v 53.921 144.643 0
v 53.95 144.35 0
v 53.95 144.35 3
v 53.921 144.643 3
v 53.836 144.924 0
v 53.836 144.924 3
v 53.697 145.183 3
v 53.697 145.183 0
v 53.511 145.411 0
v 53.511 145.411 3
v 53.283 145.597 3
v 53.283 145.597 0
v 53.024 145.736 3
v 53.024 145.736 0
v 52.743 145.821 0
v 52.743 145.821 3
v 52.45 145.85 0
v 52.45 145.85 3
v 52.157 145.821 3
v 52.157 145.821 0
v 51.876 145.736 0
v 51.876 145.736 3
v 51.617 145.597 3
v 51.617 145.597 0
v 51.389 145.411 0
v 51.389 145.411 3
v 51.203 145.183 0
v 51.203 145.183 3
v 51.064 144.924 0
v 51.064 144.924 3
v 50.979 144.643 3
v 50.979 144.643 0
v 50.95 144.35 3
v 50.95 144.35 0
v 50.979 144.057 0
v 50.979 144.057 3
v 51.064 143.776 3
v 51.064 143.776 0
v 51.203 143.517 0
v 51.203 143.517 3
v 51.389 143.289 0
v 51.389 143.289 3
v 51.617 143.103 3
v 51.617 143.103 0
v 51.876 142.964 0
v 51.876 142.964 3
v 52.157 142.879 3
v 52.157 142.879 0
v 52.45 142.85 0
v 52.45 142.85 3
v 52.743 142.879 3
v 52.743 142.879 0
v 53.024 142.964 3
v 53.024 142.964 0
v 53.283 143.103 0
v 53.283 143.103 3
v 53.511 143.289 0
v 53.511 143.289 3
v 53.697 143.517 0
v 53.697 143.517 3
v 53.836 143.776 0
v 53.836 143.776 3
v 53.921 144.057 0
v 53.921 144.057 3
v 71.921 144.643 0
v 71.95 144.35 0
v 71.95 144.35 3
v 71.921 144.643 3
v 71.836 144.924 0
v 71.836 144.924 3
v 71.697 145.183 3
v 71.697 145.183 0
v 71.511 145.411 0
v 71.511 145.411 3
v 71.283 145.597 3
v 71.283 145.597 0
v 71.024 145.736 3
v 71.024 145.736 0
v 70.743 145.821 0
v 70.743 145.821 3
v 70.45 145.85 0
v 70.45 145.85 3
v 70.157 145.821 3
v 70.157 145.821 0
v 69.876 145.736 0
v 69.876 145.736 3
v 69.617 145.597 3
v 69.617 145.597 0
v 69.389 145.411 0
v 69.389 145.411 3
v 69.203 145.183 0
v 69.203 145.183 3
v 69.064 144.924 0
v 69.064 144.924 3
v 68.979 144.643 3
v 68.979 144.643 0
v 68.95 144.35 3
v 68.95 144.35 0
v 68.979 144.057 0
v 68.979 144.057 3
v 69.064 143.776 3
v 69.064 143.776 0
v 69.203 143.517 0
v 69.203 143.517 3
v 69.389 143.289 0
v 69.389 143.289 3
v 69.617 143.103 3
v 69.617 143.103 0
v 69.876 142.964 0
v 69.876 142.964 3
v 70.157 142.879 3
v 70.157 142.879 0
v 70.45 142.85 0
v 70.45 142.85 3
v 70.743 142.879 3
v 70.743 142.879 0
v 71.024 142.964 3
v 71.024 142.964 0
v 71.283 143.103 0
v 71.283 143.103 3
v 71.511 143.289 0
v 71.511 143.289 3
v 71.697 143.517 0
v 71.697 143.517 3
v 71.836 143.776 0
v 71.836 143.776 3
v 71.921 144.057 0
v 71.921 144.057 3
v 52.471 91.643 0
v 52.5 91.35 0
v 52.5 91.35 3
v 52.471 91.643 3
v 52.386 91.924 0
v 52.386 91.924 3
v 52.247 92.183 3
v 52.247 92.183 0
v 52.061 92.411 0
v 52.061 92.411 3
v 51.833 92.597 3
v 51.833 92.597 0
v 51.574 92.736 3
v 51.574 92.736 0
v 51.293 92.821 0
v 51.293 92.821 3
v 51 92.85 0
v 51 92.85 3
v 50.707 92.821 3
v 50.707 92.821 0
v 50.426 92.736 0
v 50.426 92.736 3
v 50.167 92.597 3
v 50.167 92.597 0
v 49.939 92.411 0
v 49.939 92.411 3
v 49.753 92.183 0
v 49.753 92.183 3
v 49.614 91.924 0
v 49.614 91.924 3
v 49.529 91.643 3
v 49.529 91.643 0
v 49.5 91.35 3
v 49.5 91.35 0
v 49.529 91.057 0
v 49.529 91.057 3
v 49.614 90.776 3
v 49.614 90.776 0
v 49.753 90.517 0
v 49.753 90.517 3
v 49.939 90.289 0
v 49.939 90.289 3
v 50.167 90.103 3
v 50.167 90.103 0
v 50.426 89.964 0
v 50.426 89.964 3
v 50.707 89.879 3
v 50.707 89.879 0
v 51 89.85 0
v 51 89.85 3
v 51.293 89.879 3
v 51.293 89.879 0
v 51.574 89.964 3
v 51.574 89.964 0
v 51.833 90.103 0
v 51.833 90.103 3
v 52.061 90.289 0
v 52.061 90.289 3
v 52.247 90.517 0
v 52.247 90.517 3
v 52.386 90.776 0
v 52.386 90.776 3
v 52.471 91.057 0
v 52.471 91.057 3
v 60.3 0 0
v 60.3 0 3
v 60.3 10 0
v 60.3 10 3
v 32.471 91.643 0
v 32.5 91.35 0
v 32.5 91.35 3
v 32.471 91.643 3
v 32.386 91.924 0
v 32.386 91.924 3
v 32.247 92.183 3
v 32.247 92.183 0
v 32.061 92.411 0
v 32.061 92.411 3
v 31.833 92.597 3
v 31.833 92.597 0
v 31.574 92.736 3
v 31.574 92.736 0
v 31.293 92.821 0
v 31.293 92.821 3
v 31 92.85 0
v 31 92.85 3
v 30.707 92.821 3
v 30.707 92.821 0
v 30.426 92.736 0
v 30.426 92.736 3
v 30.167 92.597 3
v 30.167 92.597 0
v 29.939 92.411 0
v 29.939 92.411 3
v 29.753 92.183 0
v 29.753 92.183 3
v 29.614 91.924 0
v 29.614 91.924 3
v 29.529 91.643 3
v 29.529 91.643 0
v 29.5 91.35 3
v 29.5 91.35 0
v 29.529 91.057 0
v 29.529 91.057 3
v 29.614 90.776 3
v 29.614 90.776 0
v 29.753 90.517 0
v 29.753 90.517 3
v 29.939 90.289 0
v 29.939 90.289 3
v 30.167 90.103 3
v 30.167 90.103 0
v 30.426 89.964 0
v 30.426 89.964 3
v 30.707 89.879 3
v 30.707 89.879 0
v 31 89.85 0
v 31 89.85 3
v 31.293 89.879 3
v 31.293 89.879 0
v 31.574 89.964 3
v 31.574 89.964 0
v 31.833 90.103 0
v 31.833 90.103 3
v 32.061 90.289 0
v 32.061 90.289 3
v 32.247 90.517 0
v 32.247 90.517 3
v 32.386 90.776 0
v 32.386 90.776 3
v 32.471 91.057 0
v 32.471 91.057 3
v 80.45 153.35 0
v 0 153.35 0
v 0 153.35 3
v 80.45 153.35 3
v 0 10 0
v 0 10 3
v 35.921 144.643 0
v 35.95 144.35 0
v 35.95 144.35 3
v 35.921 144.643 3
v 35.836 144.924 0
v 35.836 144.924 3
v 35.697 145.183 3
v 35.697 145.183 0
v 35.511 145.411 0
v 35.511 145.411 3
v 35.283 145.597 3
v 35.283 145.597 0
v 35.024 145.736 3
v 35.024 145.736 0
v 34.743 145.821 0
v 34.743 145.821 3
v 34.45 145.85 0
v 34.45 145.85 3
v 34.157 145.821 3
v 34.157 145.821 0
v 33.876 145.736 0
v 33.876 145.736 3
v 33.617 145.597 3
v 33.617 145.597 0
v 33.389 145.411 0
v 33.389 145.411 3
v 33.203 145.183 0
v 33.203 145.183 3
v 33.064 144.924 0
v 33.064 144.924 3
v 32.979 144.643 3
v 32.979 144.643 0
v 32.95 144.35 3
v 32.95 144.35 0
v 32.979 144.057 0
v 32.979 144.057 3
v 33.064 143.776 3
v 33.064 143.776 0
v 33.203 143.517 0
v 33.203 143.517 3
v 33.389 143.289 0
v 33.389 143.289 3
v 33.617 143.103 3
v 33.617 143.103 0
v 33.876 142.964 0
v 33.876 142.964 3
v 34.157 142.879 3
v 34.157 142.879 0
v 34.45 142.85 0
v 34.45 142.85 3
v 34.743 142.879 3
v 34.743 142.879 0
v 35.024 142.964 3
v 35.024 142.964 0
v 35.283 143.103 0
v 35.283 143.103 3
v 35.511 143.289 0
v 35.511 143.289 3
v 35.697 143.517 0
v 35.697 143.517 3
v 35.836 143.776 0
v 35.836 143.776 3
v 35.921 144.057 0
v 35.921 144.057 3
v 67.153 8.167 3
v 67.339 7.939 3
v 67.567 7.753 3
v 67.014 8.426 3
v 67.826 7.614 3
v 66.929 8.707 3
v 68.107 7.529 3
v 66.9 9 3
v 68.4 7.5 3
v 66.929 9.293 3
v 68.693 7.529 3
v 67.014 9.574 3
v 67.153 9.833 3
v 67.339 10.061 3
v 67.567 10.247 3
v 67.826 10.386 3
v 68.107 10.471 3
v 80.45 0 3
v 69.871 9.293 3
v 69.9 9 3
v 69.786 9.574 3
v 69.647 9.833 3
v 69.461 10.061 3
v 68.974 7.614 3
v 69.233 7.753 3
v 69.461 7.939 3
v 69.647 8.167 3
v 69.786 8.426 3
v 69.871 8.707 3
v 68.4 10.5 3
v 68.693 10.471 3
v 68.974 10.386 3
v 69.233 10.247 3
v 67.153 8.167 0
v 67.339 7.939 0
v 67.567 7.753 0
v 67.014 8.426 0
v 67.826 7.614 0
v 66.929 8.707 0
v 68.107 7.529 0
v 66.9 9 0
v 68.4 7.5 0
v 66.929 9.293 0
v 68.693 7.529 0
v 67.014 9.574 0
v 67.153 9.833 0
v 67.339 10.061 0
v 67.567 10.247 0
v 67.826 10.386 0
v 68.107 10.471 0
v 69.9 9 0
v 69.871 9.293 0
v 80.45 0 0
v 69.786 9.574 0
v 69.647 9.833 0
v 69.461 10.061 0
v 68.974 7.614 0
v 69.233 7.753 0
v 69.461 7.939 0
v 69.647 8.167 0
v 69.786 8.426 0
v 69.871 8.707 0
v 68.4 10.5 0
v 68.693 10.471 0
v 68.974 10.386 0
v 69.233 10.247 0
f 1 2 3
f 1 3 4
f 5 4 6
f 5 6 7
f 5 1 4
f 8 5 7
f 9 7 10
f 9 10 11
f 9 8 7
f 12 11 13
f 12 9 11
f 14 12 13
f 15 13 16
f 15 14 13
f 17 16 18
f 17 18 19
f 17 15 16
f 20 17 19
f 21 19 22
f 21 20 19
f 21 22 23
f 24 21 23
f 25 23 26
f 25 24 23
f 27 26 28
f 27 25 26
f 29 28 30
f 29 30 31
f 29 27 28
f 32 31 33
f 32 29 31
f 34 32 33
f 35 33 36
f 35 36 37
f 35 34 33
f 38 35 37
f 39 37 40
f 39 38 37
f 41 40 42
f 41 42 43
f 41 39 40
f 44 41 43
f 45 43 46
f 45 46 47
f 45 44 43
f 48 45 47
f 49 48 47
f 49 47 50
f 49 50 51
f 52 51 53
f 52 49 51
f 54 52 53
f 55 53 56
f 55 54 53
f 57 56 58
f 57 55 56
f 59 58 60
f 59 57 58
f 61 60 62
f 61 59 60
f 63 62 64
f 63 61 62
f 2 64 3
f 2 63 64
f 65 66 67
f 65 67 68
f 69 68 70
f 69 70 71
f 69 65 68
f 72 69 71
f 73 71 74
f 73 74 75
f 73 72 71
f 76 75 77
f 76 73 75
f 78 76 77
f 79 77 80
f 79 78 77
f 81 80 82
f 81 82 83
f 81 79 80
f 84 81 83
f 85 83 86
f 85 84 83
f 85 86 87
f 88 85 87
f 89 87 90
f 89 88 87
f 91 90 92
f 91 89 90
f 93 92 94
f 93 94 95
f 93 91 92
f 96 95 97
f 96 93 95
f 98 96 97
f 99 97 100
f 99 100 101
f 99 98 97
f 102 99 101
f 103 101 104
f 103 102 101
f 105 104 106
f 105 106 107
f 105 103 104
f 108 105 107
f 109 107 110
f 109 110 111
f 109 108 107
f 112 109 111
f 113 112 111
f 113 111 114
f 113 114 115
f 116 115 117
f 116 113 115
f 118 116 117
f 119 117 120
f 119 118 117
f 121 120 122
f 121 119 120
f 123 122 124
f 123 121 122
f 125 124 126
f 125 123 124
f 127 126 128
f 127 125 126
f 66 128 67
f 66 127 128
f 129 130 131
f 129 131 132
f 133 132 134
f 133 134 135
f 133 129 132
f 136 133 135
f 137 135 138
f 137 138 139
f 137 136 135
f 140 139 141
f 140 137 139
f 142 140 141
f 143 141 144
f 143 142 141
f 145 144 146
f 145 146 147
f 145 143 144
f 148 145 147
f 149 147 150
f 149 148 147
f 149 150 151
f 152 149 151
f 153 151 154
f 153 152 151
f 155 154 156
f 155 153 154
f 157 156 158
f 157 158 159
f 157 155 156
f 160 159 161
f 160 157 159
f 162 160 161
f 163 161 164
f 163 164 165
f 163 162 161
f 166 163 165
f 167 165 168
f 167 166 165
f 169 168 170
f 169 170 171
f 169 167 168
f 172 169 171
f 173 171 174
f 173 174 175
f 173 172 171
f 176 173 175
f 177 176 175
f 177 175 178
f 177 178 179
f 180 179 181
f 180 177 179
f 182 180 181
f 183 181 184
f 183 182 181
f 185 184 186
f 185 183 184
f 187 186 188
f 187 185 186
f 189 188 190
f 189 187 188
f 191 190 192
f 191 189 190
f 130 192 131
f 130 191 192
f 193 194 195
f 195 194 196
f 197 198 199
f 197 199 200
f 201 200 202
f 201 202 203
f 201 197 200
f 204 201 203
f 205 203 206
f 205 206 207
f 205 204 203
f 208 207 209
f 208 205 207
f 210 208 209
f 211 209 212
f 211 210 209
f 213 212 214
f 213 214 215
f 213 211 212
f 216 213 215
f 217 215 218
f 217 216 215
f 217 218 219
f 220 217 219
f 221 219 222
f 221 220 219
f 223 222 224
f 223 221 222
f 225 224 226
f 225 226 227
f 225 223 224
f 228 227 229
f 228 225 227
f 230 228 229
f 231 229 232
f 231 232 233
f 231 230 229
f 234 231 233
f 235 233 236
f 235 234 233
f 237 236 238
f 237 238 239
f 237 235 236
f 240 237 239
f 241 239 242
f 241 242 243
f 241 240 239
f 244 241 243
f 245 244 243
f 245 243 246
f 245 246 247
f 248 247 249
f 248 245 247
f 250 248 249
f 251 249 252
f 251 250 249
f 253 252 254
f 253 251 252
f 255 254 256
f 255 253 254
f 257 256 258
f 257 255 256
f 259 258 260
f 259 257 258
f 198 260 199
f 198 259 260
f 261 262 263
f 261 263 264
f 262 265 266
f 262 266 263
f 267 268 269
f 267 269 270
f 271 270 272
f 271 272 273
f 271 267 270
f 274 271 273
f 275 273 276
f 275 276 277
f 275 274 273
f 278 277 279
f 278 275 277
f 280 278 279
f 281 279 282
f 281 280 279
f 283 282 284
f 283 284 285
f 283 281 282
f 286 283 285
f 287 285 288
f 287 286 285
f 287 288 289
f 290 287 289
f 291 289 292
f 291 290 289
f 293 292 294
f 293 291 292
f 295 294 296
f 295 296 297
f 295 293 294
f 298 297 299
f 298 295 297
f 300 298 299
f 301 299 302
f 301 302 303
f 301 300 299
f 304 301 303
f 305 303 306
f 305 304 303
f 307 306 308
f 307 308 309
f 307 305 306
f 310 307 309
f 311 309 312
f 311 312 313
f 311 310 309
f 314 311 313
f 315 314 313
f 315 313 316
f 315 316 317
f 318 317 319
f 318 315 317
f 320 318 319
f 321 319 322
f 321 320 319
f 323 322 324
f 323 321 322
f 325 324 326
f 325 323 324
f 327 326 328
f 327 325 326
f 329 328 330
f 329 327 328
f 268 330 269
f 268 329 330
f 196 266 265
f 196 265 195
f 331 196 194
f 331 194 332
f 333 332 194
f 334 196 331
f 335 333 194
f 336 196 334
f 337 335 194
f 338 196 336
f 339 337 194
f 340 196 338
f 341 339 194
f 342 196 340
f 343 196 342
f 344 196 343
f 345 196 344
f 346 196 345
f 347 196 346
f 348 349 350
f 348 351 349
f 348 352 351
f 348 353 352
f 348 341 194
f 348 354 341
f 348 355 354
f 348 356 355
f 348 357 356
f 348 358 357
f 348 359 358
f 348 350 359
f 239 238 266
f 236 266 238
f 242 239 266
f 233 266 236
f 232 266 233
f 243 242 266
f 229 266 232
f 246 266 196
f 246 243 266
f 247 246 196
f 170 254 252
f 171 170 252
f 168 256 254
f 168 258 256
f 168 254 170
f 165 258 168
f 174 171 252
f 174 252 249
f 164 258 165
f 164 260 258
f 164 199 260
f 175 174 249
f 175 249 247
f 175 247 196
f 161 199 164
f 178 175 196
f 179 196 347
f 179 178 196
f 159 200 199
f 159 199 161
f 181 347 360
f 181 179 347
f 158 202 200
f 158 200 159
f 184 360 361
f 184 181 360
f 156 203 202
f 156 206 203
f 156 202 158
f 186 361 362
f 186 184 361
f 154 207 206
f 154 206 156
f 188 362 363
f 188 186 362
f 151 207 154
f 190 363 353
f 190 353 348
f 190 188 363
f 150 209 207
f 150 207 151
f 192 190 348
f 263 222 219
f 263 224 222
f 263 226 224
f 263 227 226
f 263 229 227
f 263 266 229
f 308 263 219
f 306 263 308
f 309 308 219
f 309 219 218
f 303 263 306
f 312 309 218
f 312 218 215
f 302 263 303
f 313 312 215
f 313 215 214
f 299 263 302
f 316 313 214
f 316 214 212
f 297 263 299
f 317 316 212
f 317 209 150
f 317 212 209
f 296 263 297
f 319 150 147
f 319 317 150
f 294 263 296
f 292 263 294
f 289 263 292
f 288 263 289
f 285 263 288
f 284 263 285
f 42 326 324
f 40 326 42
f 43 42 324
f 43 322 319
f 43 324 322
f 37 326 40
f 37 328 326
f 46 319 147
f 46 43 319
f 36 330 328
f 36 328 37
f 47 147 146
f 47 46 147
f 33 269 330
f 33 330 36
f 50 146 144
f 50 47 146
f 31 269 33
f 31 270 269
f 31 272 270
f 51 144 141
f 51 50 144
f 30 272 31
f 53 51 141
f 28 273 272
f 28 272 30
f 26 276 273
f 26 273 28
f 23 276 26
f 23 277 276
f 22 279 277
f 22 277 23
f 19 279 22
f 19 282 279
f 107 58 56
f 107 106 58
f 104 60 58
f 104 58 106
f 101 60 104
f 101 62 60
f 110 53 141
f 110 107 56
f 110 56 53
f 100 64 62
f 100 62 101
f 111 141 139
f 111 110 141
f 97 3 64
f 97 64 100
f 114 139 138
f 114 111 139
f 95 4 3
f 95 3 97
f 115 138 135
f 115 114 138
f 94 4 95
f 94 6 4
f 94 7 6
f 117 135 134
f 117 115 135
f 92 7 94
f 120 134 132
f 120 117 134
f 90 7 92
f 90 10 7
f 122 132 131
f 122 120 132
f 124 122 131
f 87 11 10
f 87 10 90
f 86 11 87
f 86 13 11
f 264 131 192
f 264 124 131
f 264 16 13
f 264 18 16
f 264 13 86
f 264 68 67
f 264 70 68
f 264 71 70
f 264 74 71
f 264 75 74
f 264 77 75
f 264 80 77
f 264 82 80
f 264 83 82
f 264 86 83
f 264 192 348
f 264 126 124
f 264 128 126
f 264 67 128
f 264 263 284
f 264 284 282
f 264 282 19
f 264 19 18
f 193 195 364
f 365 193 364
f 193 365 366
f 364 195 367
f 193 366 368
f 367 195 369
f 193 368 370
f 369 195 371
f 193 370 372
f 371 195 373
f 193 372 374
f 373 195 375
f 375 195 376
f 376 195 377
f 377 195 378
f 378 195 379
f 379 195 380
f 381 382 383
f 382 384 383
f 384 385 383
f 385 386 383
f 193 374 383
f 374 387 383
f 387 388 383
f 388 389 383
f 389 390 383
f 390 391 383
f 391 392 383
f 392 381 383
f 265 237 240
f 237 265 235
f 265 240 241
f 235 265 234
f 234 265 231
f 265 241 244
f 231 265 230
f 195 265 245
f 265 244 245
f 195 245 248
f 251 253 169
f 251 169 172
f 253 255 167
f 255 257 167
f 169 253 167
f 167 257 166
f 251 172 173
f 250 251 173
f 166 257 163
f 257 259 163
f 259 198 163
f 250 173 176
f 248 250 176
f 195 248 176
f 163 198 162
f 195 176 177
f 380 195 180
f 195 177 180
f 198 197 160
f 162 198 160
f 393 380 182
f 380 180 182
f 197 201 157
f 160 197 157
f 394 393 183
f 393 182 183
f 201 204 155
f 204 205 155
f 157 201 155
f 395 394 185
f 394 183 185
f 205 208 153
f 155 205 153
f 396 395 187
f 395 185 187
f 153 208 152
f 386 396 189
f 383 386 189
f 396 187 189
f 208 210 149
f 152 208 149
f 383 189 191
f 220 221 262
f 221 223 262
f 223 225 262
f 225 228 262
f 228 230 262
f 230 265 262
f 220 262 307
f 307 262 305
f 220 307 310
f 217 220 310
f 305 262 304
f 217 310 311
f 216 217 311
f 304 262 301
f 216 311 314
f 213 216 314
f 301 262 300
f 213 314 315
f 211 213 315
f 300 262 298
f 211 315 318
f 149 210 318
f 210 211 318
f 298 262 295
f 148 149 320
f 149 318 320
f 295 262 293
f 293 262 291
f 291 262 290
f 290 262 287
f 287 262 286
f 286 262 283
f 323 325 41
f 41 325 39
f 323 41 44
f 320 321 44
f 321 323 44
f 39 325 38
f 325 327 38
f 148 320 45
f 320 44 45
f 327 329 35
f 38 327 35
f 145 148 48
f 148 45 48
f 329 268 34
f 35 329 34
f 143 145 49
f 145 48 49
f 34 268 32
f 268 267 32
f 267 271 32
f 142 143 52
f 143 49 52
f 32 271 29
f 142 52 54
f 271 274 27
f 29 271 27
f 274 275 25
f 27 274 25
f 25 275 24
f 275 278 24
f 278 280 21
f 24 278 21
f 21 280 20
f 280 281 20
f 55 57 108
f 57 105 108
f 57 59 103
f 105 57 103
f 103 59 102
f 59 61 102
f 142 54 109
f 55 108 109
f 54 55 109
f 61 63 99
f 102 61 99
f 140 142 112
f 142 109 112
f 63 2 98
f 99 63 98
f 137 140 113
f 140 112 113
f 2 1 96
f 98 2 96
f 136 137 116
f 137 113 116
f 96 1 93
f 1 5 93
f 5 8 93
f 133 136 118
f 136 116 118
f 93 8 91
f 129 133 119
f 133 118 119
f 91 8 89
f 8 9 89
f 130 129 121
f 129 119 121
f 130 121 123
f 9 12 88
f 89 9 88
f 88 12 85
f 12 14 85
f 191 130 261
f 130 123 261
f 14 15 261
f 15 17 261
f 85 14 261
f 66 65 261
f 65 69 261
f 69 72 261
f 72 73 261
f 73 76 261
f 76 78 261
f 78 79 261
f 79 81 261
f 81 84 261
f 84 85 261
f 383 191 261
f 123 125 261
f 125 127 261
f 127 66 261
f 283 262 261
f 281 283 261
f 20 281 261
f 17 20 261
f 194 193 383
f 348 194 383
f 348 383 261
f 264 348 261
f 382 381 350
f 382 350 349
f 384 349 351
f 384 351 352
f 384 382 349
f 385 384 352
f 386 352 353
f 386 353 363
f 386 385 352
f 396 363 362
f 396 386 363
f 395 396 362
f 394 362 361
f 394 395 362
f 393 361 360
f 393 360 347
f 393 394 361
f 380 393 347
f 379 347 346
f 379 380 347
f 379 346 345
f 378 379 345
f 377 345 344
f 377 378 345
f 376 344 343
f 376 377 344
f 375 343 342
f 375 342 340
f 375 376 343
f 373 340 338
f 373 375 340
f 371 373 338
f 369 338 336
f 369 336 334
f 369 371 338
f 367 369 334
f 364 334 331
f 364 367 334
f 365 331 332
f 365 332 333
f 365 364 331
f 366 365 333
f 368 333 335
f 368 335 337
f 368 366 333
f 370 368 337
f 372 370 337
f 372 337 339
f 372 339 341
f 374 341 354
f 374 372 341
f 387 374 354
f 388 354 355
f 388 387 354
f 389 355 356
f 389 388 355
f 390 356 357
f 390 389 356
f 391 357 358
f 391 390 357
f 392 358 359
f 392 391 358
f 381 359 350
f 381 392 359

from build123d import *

# Parameters (mm, degrees)
SKETCH_W     = 80.45
SKETCH_H     = 153.35
SKETCH_R     = 1.5
PAD_DEPTH    = 3
SKETCH001_W  = 60.3
SKETCH001_H  = 10
POCKET_DEPTH = 3.001


with BuildPart() as part:
    # Sketch → Pad (new body)
    with BuildSketch(Plane.XY):
        with Locations((40.225, 76.675)):
            Rectangle(SKETCH_W, SKETCH_H)
        with Locations((68.4, 9)):
            Circle(SKETCH_R, mode=Mode.SUBTRACT)
        with Locations((70.45, 144.35)):
            Circle(SKETCH_R, mode=Mode.SUBTRACT)
        with Locations((52.45, 144.35)):
            Circle(SKETCH_R, mode=Mode.SUBTRACT)
        with Locations((34.45, 144.35)):
            Circle(SKETCH_R, mode=Mode.SUBTRACT)
        with Locations((31, 91.35)):
            Circle(SKETCH_R, mode=Mode.SUBTRACT)
        with Locations((51, 91.35)):
            Circle(SKETCH_R, mode=Mode.SUBTRACT)
    extrude(amount=PAD_DEPTH)

    # Sketch001 → Pocket (cut, through all)
    with BuildSketch(Plane.XY.offset(3)):
        with Locations((30.15, 5)):
            Rectangle(SKETCH001_W, SKETCH001_H)
    extrude(amount=-POCKET_DEPTH, mode=Mode.SUBTRACT)


solid = part.part
